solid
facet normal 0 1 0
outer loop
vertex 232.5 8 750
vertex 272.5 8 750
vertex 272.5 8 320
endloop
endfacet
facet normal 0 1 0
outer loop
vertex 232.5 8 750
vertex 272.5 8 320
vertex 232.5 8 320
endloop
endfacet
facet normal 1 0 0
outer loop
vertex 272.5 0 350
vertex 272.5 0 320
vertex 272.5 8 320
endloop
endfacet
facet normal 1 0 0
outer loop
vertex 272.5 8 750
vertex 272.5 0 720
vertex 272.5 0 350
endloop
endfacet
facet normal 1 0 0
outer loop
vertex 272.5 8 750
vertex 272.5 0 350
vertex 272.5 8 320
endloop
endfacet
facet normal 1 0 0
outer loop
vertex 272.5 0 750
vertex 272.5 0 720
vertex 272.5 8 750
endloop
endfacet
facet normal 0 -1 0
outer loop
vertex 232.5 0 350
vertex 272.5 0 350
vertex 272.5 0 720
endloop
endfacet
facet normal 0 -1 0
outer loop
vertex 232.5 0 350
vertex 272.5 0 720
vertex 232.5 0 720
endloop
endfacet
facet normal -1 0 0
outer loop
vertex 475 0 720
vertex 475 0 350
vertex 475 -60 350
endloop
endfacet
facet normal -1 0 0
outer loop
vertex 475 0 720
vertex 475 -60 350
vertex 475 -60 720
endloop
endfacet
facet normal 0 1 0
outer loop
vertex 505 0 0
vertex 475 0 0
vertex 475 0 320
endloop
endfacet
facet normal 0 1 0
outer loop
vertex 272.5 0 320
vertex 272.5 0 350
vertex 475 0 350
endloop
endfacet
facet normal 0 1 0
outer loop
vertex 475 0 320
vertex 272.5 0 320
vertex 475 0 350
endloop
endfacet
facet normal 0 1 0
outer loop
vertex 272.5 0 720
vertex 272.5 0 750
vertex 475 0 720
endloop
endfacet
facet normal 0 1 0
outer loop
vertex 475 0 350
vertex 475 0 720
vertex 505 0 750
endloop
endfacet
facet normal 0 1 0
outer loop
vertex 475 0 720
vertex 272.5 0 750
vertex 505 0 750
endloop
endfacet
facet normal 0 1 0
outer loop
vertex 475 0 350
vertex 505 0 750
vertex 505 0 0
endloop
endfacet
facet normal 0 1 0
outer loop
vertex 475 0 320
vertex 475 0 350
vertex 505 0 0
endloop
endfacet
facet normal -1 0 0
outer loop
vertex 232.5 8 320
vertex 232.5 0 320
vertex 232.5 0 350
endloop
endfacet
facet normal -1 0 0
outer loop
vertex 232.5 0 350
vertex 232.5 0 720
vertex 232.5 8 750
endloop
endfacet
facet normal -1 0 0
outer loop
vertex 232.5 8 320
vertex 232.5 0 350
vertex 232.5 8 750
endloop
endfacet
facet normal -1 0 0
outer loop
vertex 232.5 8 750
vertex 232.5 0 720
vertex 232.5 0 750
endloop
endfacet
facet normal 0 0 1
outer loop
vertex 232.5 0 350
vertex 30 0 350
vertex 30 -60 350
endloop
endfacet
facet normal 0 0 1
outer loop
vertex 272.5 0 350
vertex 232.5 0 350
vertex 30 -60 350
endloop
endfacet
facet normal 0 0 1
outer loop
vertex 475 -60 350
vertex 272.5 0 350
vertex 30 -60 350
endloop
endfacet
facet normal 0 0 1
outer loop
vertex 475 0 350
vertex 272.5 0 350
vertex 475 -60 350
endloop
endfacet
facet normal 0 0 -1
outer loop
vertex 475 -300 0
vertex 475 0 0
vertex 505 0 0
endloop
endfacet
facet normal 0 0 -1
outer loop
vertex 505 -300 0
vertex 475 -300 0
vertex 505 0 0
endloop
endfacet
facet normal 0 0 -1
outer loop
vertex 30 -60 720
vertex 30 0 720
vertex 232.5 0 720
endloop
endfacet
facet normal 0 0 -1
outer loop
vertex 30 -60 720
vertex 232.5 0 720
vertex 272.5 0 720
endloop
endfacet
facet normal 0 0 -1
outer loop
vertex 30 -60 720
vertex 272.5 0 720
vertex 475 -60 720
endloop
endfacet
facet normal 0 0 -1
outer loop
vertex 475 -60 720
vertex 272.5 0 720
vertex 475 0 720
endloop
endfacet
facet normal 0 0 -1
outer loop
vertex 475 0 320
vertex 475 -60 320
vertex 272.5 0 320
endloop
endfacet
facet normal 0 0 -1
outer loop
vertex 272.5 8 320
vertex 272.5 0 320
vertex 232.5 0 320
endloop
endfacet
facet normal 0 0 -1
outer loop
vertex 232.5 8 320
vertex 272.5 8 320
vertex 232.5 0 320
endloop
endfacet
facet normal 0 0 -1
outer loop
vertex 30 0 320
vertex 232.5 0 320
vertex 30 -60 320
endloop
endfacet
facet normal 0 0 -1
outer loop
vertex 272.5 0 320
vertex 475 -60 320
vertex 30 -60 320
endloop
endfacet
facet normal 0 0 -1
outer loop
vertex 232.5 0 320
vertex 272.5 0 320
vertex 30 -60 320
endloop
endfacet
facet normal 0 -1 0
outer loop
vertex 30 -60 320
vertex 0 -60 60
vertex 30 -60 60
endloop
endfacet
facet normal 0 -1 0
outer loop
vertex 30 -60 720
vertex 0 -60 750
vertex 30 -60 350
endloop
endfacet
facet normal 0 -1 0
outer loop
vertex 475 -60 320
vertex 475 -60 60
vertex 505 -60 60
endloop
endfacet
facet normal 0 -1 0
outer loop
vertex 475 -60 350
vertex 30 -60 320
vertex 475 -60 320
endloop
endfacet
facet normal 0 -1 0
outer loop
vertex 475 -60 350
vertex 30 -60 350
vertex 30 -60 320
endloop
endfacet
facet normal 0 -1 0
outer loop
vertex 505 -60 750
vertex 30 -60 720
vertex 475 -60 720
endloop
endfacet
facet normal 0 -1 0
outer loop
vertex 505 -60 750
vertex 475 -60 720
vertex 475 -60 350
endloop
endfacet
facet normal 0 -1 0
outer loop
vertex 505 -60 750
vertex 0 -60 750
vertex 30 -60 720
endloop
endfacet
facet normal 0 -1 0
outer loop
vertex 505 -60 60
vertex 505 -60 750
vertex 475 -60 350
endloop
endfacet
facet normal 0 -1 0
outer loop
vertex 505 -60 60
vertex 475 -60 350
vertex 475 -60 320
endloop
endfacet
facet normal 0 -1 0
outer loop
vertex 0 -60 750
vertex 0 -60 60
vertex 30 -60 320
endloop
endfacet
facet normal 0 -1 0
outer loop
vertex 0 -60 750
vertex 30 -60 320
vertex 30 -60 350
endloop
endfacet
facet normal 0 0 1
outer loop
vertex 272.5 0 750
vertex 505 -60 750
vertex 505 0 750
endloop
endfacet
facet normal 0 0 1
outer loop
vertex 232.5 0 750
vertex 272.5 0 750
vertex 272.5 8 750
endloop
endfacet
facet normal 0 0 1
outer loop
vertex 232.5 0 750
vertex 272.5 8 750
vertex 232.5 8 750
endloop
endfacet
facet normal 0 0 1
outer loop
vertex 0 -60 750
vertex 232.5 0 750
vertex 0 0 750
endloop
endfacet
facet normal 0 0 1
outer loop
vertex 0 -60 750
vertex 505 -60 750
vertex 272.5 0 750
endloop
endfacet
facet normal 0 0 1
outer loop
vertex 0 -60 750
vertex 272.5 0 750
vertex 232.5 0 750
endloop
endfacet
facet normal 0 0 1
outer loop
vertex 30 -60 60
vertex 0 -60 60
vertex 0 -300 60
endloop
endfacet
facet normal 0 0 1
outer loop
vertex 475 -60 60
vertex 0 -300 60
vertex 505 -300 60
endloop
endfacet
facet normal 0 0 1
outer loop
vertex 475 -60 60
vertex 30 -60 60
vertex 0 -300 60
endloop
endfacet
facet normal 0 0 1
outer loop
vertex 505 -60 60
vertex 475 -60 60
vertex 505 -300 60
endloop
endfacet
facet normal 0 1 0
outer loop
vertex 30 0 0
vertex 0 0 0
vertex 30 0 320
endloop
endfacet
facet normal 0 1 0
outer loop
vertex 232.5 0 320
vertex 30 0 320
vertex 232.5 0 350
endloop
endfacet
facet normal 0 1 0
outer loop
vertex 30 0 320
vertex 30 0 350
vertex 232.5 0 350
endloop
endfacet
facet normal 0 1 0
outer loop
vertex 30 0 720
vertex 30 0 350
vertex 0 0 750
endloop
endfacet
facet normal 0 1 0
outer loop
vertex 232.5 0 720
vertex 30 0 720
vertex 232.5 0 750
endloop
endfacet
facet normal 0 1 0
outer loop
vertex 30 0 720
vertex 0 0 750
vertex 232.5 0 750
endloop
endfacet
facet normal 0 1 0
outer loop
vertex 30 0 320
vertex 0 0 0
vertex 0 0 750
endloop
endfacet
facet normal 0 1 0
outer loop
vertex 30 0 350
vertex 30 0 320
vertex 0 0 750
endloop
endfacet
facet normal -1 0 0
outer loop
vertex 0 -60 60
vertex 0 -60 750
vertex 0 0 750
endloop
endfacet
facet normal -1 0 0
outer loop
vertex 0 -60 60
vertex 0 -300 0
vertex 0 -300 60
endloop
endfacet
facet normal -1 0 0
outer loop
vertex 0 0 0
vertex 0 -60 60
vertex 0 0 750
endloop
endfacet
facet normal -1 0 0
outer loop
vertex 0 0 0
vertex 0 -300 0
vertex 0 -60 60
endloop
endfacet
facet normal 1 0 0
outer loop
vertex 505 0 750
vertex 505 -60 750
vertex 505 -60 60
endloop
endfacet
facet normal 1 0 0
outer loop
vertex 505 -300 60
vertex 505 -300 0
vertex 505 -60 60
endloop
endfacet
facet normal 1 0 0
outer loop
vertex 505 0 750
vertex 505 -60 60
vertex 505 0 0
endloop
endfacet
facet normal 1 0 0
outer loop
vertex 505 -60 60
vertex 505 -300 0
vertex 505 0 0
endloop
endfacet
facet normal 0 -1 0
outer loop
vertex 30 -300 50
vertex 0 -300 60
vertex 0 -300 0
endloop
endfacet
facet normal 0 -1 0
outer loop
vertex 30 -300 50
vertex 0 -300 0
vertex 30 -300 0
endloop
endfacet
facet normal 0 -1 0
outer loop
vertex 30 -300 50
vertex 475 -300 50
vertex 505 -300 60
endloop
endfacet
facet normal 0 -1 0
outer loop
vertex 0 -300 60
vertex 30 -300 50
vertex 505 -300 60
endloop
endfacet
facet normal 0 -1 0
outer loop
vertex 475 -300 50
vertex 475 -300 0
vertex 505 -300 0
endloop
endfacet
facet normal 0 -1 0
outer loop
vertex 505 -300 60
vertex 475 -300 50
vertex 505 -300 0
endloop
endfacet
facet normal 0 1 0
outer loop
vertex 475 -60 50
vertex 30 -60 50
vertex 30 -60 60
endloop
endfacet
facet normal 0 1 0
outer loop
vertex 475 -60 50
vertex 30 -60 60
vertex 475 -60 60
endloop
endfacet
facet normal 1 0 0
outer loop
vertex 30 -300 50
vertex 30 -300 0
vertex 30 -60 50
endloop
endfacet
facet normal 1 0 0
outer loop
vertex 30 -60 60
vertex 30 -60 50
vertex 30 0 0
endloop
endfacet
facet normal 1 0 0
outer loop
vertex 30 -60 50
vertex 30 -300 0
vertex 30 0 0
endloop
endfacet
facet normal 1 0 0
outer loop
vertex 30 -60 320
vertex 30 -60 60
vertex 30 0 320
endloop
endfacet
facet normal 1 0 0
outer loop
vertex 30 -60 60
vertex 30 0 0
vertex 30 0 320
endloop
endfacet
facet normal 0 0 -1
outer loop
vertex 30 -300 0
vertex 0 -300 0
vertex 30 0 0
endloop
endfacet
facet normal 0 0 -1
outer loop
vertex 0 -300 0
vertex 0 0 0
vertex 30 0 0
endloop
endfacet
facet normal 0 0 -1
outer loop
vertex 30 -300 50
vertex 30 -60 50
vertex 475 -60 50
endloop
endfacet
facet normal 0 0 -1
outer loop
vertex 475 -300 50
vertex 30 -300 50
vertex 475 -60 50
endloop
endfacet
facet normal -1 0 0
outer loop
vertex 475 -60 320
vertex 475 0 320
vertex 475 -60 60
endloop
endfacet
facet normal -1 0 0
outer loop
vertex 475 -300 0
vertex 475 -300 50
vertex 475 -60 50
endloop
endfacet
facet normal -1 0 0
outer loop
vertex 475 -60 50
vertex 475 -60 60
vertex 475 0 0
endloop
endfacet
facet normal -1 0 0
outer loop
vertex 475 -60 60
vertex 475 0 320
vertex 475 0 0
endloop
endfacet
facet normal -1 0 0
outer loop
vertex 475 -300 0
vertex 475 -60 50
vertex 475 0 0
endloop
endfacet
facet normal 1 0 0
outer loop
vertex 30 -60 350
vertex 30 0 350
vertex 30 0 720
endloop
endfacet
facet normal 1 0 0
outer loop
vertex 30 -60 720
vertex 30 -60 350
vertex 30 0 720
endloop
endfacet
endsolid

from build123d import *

# Parameters (mm, degrees)
F0_W     = 445
F0_H     = 370
F1_DEPTH = 60
F2_W     = 30
F2_H     = 50
F3_DEPTH = 240
F4_W     = 505
F4_H     = 240
F5_DEPTH = 10
F6_W     = 40
F6_H     = 430
F7_DEPTH = 8


with BuildPart() as f1:
    # F0 (on Front) → F1 (new body)
    with BuildSketch(Plane.XZ):
        Polygon((505, 750), (0, 750), (0, 0), (30, 0), (30, 320), (475, 320), (475, 0), (505, 0), align=None)
        with Locations((252.5, 535)):
            Rectangle(F0_W, F0_H, mode=Mode.SUBTRACT)
    extrude(amount=F1_DEPTH)

    # F2 (on face) → F3 (join)
    with BuildSketch(Plane.XZ.offset(60)):
        with Locations((15, 25)):
            Rectangle(F2_W, F2_H)
        with Locations((490, 25)):
            Rectangle(F2_W, F2_H)
    extrude(amount=F3_DEPTH)

    # F4 (on face) → F5 (join)
    with BuildSketch(Plane.XY.offset(50)):
        with Locations((252.5, -180)):
            Rectangle(F4_W, F4_H)
    extrude(amount=F5_DEPTH)

    # F6 (on face) → F7 (join)
    with BuildSketch(Plane(origin=(0, 0, 0), x_dir=(-1, 0, 0), z_dir=(0, 1, 0))):
        with Locations((-252.5, 535)):
            Rectangle(F6_W, F6_H)
    extrude(amount=F7_DEPTH)


solid = f1.part
